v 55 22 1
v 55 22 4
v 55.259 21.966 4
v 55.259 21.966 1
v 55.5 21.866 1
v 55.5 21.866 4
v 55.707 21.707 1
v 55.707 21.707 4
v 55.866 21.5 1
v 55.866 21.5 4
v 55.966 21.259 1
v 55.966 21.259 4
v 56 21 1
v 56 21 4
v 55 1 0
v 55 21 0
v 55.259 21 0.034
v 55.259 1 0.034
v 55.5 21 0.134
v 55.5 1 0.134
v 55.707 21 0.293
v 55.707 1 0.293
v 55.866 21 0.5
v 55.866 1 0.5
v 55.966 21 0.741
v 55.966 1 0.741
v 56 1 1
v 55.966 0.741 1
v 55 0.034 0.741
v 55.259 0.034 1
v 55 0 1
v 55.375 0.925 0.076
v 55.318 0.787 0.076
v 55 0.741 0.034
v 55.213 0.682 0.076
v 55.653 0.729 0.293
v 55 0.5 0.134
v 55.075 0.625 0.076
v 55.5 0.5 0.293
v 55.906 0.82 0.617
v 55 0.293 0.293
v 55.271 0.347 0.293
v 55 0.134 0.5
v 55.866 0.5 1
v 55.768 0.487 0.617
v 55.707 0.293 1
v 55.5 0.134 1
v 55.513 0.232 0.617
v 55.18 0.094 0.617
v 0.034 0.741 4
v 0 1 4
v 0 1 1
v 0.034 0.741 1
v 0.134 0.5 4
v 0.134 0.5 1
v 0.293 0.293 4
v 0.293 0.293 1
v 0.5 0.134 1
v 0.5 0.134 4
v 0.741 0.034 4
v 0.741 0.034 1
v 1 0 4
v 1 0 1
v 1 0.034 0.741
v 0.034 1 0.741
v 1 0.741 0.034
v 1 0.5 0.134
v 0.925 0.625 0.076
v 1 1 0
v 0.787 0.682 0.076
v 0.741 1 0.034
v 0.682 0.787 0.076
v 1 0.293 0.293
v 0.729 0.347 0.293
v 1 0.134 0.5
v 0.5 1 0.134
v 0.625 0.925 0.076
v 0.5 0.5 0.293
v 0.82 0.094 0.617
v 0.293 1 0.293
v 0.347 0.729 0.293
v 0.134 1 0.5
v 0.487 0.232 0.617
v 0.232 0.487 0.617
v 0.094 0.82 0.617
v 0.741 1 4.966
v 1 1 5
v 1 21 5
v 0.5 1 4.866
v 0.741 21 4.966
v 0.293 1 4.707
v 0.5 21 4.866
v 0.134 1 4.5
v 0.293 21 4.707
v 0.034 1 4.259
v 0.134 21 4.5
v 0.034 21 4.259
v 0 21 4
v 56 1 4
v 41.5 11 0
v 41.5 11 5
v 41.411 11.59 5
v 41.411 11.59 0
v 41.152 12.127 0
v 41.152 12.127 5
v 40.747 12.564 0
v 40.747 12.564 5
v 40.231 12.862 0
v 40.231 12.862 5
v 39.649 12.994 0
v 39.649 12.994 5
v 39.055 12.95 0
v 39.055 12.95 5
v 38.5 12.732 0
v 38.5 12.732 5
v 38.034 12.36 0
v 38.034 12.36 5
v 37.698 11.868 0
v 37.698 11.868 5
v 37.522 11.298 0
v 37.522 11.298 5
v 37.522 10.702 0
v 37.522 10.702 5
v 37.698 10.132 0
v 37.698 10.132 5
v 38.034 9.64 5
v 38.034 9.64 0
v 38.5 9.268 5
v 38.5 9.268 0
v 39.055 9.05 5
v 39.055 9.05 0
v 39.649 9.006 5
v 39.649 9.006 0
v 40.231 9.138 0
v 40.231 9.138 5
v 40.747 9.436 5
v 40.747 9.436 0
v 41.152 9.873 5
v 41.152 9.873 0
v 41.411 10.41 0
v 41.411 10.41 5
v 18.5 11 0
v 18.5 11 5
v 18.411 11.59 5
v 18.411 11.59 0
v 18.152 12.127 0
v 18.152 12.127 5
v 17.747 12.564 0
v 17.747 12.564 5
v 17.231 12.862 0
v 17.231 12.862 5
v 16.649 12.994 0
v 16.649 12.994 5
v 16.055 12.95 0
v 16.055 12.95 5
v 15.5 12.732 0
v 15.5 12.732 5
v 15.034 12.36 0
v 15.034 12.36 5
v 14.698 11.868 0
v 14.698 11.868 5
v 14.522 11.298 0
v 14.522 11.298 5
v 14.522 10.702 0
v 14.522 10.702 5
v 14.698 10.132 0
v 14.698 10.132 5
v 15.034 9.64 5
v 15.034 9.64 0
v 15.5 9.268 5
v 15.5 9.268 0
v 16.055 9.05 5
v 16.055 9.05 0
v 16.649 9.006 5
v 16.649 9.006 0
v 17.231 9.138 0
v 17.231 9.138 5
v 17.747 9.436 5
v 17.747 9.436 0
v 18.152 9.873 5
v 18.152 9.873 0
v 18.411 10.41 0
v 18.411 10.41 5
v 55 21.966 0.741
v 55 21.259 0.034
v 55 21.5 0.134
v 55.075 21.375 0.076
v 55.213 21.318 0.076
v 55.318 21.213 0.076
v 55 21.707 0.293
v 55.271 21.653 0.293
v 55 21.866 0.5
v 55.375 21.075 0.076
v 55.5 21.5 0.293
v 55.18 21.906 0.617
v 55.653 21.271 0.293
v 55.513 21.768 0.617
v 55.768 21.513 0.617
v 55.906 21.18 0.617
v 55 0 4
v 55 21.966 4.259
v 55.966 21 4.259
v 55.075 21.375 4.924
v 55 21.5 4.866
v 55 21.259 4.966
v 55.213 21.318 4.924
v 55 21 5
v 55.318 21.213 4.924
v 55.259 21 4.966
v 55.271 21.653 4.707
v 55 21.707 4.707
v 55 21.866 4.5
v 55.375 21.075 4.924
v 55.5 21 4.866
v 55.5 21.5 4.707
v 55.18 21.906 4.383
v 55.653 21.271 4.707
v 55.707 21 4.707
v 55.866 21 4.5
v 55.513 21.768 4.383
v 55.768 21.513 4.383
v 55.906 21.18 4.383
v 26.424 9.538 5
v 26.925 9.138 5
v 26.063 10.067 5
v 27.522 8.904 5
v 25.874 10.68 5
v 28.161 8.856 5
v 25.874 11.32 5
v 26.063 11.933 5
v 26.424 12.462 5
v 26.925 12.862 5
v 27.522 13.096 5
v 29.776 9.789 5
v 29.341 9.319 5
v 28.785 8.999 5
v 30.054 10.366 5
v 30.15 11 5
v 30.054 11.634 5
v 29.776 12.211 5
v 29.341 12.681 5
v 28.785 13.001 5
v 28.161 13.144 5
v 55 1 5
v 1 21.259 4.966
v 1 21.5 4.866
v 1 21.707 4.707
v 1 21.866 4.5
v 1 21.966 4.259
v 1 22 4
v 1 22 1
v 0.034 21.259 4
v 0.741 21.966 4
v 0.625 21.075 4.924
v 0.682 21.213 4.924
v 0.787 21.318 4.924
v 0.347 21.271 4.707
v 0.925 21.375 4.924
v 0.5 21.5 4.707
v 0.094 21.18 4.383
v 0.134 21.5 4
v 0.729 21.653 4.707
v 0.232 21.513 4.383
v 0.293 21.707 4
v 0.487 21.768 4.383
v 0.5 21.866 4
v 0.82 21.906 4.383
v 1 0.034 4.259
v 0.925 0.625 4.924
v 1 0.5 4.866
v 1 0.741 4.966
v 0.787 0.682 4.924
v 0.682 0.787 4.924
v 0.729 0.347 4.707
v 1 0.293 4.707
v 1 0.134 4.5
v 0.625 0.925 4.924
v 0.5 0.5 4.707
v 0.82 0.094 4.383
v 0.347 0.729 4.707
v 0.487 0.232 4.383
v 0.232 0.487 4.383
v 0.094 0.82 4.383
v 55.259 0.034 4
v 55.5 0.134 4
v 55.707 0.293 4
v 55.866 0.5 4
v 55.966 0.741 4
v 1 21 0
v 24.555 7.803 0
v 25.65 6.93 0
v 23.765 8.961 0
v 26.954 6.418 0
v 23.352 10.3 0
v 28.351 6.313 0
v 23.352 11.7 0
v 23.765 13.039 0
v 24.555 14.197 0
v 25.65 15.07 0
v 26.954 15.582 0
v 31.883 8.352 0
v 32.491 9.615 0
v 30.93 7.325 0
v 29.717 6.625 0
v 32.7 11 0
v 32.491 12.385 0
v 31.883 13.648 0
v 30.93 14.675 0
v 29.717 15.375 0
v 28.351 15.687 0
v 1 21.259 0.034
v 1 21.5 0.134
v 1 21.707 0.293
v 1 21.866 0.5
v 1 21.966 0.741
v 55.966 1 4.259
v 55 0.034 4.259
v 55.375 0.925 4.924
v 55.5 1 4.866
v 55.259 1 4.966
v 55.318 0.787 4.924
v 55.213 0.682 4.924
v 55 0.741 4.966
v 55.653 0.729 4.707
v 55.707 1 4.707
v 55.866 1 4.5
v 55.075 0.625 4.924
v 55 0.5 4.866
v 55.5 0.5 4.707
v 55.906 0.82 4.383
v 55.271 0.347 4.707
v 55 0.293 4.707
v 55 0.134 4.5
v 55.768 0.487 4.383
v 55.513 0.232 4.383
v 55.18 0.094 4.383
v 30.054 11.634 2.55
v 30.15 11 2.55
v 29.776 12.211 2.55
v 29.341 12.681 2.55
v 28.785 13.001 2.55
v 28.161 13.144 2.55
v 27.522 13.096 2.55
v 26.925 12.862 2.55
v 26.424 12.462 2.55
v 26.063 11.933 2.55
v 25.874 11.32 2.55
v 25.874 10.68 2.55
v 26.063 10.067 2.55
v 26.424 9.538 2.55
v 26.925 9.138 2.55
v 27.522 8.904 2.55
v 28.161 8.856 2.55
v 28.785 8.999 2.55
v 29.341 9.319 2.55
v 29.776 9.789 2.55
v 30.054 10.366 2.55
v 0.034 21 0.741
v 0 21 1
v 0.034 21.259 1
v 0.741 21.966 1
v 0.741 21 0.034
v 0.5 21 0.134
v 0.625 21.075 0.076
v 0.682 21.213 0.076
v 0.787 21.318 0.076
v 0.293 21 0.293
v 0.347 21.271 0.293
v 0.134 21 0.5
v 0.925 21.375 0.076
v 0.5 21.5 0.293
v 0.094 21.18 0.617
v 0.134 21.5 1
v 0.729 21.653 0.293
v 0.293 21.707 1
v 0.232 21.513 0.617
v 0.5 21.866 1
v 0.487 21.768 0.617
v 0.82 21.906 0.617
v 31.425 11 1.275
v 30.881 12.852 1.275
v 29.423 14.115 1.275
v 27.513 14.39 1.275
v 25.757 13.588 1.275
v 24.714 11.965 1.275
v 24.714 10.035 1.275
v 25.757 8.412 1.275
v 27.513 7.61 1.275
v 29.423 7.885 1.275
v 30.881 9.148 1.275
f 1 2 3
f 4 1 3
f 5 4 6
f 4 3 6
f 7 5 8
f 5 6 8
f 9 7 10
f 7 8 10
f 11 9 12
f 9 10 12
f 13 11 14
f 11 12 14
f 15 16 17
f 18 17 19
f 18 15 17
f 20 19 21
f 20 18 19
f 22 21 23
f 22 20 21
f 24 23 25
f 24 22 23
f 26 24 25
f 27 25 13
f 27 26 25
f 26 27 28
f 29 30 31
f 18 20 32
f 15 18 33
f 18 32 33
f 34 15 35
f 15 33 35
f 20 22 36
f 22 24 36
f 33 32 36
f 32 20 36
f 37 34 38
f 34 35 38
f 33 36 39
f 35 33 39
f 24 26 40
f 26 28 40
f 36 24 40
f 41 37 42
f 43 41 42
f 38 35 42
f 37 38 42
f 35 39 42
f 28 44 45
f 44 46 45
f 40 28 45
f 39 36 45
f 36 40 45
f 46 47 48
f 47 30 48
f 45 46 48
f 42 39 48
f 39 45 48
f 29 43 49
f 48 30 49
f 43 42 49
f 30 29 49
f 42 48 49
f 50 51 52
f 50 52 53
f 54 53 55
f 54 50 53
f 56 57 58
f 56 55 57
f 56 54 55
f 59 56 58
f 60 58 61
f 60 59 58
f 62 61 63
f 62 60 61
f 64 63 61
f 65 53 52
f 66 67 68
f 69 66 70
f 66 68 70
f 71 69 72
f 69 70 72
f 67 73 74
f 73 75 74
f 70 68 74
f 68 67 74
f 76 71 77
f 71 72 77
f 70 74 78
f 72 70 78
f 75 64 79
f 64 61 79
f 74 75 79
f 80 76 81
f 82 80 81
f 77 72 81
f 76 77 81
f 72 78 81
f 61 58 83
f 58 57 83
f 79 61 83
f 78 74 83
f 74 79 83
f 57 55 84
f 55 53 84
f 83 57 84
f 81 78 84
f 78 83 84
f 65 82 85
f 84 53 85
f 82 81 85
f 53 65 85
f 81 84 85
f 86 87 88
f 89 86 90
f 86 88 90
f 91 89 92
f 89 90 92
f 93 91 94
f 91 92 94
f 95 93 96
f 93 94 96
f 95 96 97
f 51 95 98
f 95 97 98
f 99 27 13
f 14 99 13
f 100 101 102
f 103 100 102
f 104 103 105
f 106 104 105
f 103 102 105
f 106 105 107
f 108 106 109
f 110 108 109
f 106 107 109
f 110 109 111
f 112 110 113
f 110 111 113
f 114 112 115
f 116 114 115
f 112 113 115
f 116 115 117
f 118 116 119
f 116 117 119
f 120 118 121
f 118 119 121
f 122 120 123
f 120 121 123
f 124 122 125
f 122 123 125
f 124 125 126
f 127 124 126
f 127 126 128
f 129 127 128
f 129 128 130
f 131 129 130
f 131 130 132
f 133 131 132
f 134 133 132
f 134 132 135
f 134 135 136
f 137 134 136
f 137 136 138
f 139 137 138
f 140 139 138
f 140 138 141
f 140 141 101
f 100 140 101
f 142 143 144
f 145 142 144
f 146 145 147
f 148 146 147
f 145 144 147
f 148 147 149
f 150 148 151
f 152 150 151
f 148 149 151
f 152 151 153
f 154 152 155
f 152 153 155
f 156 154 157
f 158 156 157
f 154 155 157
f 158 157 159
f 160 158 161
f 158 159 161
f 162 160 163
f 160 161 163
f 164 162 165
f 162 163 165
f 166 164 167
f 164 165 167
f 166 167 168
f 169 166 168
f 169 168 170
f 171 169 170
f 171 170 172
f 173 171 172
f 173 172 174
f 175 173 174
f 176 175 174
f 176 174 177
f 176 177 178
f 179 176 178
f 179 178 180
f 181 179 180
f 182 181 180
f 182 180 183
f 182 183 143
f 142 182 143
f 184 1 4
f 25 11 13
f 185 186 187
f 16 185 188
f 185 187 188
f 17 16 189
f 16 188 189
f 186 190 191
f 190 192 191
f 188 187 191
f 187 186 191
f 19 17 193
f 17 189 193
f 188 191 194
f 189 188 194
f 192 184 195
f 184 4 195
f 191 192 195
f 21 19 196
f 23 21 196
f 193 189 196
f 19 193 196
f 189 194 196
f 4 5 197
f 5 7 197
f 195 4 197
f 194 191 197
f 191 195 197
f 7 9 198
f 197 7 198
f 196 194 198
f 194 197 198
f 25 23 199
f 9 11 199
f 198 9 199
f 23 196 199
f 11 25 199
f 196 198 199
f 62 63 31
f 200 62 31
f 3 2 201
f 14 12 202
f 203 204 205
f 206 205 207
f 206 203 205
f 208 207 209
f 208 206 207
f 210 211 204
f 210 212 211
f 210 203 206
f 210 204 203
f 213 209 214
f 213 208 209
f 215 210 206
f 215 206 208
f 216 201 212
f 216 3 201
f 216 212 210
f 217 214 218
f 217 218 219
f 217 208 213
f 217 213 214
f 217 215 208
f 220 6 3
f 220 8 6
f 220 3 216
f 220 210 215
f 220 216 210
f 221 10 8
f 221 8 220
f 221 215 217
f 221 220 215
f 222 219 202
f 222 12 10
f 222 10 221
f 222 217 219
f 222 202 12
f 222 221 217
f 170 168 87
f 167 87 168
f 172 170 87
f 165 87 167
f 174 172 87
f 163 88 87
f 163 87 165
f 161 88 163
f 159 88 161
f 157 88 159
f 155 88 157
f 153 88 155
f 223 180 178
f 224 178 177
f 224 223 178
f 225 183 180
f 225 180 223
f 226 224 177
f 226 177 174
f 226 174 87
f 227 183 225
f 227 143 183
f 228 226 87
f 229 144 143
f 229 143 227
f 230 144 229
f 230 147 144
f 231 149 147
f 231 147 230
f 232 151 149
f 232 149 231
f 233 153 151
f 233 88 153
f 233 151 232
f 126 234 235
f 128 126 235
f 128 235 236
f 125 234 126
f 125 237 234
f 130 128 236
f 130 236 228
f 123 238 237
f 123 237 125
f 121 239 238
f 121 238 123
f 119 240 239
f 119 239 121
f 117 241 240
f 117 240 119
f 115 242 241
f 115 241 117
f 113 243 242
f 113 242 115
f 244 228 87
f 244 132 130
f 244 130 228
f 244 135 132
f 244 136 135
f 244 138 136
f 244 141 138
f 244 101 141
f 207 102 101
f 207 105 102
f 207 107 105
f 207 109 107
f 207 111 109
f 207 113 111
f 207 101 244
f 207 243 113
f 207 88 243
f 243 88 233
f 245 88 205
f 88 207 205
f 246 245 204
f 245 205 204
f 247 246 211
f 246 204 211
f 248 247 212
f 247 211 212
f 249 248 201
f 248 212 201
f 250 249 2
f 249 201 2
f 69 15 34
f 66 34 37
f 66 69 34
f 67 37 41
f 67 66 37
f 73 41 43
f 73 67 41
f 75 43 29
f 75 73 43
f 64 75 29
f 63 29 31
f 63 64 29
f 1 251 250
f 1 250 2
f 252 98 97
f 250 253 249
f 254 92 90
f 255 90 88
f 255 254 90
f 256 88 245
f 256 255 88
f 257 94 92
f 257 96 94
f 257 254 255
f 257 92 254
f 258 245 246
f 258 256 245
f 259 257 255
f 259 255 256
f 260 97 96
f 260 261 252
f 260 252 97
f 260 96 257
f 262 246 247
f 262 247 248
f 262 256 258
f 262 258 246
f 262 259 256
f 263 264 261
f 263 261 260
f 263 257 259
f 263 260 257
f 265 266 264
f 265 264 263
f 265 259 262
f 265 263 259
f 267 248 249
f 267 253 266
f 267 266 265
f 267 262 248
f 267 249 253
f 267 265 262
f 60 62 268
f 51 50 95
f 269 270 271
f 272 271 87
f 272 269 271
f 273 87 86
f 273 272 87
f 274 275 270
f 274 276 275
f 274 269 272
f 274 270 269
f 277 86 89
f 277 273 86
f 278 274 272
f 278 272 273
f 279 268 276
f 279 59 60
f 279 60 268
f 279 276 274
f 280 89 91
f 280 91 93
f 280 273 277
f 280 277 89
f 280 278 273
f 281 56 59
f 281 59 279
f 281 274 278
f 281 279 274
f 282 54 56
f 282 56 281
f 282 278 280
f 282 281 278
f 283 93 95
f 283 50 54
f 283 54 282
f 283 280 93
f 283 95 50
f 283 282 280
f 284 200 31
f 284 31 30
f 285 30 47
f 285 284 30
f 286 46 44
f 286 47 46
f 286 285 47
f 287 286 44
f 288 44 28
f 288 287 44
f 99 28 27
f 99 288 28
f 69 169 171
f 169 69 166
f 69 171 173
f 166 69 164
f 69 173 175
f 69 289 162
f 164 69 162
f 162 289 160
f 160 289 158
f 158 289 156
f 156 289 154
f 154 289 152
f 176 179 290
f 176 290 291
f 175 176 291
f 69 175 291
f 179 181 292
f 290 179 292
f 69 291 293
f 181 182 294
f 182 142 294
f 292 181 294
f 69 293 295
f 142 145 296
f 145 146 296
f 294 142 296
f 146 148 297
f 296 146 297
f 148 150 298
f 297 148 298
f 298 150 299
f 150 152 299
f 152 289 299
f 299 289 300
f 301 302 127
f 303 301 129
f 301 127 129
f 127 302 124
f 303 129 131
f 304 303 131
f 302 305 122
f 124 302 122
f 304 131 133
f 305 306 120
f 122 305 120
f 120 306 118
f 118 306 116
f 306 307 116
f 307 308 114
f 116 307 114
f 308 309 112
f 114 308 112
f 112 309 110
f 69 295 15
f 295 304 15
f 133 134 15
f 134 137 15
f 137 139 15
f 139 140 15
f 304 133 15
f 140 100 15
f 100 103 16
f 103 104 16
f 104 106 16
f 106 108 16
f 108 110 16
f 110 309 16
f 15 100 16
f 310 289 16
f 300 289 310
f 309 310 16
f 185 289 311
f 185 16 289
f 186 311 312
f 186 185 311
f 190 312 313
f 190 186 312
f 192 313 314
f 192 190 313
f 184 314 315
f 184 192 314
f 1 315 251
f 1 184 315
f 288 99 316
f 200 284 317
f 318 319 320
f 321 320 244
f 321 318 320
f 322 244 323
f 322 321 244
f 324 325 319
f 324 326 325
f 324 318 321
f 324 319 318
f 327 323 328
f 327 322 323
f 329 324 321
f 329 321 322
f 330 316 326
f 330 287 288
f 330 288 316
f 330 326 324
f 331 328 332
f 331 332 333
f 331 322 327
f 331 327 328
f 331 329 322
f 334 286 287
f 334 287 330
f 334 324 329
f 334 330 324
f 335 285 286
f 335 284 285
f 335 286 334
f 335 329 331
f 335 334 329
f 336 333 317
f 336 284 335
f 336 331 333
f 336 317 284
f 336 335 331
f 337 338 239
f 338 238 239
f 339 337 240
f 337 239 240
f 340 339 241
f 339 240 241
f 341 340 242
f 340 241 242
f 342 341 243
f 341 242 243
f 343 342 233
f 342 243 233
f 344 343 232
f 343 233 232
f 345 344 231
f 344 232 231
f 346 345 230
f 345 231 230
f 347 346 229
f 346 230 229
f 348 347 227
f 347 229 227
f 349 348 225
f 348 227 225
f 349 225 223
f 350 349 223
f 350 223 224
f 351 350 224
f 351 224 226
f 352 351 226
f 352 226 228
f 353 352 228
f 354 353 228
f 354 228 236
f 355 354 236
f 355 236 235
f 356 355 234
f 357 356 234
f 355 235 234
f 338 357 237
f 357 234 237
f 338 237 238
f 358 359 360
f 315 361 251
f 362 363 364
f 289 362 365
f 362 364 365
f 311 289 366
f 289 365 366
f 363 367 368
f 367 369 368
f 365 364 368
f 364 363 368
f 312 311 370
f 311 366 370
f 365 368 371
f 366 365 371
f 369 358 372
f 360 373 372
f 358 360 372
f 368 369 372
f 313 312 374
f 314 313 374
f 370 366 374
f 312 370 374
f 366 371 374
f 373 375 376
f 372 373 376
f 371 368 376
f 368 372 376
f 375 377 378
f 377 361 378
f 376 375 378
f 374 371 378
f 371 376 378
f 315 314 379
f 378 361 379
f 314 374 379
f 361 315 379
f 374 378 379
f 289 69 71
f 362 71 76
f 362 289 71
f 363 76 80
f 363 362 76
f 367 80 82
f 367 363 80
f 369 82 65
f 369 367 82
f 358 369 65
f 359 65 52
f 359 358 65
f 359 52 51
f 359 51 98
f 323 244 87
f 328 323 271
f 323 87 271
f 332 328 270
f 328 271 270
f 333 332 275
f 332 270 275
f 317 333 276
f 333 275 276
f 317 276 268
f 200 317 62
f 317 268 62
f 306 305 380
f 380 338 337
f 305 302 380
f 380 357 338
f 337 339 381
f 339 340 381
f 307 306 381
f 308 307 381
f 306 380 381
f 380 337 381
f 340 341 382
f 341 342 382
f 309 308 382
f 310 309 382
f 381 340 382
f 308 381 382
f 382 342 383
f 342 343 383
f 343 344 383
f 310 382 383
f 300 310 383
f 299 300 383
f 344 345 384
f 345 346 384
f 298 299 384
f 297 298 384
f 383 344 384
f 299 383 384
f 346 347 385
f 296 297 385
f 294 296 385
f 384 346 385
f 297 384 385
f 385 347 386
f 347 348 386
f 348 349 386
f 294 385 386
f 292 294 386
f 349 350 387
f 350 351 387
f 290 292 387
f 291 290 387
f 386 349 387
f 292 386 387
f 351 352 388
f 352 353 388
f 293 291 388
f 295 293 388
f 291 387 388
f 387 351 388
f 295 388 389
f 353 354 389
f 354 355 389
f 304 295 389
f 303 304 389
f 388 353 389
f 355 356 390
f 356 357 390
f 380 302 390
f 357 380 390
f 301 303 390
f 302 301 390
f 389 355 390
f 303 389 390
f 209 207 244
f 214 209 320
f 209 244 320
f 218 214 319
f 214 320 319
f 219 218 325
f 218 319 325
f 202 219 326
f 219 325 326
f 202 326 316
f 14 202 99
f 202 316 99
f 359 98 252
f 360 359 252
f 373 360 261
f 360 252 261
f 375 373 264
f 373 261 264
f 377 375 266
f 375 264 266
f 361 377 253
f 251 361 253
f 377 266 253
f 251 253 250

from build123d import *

# Parameters (mm, degrees)
SKETCH_BASE_W                                   = 56
SKETCH_BASE_H                                   = 22
BASE_EXTRUDE_DEPTH                              = 5
SKETCH2_R                                       = 2
MOUNTING_HOLES_DEPTH                            = 61.373835392
SMALL_EDGE_FILLET_R                             = 1
FILLET4_R                                       = 1
CSK_FOR_M4_FLAT_HEAD_MACHINE_SCREW4_D           = 4.3
CSK_FOR_M4_FLAT_HEAD_MACHINE_SCREW4_CSINK_D     = 9.4
CSK_FOR_M4_FLAT_HEAD_MACHINE_SCREW4_CSINK_ANGLE = 90


with BuildPart() as part:
    # Sketch-Base → Base-Extrude (new body)
    with BuildSketch(Plane.XY):
        with Locations((28, 11)):
            Rectangle(SKETCH_BASE_W, SKETCH_BASE_H)
    extrude(amount=BASE_EXTRUDE_DEPTH)

    # Sketch2 → Mounting Holes (cut, through all)
    with BuildSketch(Plane.XY.offset(5)):
        with Locations((16.5, 11)):
            Circle(SKETCH2_R)
        with Locations((39.5, 11)):
            Circle(SKETCH2_R)
    extrude(amount=-MOUNTING_HOLES_DEPTH, mode=Mode.SUBTRACT)

    # Small Edge Fillet
    small_edge_fillet_edges = [part.edges().sort_by_distance(p)[0] for p in [
        (0, 22, 2.5),
        (56, 22, 2.5),
        (56, 0, 2.5),
        (0, 0, 2.5),
    ]]
    fillet(small_edge_fillet_edges, radius=SMALL_EDGE_FILLET_R)

    # Fillet4
    fillet4_edges = [part.edges().sort_by_distance(p)[0] for p in [
        (28, 22, 0),
        (28, 22, 5),
        (0, 11, 0),
        (56, 11, 0),
        (28, 0, 0),
        (0.292893219, 21.707106781, 0),
        (0.292893219, 0.292893219, 0),
        (55.707106781, 0.292893219, 0),
        (55.707106781, 21.707106781, 0),
        (56, 11, 5),
        (0, 11, 5),
        (28, 0, 5),
        (0.292893219, 21.707106781, 5),
        (0.292893219, 0.292893219, 5),
        (55.707106781, 0.292893219, 5),
        (55.707106781, 21.707106781, 5),
    ]]
    fillet(fillet4_edges, radius=FILLET4_R)

    # CSK for M4 Flat Head Machine Screw4 (through all)
    with Locations(Plane(origin=(28, 11, 0), x_dir=(-1, 0, 0), z_dir=(0, 0, -1))):
        with Locations((0, 0)):
            CounterSinkHole(CSK_FOR_M4_FLAT_HEAD_MACHINE_SCREW4_D / 2, CSK_FOR_M4_FLAT_HEAD_MACHINE_SCREW4_CSINK_D / 2, counter_sink_angle=CSK_FOR_M4_FLAT_HEAD_MACHINE_SCREW4_CSINK_ANGLE)


solid = part.part
